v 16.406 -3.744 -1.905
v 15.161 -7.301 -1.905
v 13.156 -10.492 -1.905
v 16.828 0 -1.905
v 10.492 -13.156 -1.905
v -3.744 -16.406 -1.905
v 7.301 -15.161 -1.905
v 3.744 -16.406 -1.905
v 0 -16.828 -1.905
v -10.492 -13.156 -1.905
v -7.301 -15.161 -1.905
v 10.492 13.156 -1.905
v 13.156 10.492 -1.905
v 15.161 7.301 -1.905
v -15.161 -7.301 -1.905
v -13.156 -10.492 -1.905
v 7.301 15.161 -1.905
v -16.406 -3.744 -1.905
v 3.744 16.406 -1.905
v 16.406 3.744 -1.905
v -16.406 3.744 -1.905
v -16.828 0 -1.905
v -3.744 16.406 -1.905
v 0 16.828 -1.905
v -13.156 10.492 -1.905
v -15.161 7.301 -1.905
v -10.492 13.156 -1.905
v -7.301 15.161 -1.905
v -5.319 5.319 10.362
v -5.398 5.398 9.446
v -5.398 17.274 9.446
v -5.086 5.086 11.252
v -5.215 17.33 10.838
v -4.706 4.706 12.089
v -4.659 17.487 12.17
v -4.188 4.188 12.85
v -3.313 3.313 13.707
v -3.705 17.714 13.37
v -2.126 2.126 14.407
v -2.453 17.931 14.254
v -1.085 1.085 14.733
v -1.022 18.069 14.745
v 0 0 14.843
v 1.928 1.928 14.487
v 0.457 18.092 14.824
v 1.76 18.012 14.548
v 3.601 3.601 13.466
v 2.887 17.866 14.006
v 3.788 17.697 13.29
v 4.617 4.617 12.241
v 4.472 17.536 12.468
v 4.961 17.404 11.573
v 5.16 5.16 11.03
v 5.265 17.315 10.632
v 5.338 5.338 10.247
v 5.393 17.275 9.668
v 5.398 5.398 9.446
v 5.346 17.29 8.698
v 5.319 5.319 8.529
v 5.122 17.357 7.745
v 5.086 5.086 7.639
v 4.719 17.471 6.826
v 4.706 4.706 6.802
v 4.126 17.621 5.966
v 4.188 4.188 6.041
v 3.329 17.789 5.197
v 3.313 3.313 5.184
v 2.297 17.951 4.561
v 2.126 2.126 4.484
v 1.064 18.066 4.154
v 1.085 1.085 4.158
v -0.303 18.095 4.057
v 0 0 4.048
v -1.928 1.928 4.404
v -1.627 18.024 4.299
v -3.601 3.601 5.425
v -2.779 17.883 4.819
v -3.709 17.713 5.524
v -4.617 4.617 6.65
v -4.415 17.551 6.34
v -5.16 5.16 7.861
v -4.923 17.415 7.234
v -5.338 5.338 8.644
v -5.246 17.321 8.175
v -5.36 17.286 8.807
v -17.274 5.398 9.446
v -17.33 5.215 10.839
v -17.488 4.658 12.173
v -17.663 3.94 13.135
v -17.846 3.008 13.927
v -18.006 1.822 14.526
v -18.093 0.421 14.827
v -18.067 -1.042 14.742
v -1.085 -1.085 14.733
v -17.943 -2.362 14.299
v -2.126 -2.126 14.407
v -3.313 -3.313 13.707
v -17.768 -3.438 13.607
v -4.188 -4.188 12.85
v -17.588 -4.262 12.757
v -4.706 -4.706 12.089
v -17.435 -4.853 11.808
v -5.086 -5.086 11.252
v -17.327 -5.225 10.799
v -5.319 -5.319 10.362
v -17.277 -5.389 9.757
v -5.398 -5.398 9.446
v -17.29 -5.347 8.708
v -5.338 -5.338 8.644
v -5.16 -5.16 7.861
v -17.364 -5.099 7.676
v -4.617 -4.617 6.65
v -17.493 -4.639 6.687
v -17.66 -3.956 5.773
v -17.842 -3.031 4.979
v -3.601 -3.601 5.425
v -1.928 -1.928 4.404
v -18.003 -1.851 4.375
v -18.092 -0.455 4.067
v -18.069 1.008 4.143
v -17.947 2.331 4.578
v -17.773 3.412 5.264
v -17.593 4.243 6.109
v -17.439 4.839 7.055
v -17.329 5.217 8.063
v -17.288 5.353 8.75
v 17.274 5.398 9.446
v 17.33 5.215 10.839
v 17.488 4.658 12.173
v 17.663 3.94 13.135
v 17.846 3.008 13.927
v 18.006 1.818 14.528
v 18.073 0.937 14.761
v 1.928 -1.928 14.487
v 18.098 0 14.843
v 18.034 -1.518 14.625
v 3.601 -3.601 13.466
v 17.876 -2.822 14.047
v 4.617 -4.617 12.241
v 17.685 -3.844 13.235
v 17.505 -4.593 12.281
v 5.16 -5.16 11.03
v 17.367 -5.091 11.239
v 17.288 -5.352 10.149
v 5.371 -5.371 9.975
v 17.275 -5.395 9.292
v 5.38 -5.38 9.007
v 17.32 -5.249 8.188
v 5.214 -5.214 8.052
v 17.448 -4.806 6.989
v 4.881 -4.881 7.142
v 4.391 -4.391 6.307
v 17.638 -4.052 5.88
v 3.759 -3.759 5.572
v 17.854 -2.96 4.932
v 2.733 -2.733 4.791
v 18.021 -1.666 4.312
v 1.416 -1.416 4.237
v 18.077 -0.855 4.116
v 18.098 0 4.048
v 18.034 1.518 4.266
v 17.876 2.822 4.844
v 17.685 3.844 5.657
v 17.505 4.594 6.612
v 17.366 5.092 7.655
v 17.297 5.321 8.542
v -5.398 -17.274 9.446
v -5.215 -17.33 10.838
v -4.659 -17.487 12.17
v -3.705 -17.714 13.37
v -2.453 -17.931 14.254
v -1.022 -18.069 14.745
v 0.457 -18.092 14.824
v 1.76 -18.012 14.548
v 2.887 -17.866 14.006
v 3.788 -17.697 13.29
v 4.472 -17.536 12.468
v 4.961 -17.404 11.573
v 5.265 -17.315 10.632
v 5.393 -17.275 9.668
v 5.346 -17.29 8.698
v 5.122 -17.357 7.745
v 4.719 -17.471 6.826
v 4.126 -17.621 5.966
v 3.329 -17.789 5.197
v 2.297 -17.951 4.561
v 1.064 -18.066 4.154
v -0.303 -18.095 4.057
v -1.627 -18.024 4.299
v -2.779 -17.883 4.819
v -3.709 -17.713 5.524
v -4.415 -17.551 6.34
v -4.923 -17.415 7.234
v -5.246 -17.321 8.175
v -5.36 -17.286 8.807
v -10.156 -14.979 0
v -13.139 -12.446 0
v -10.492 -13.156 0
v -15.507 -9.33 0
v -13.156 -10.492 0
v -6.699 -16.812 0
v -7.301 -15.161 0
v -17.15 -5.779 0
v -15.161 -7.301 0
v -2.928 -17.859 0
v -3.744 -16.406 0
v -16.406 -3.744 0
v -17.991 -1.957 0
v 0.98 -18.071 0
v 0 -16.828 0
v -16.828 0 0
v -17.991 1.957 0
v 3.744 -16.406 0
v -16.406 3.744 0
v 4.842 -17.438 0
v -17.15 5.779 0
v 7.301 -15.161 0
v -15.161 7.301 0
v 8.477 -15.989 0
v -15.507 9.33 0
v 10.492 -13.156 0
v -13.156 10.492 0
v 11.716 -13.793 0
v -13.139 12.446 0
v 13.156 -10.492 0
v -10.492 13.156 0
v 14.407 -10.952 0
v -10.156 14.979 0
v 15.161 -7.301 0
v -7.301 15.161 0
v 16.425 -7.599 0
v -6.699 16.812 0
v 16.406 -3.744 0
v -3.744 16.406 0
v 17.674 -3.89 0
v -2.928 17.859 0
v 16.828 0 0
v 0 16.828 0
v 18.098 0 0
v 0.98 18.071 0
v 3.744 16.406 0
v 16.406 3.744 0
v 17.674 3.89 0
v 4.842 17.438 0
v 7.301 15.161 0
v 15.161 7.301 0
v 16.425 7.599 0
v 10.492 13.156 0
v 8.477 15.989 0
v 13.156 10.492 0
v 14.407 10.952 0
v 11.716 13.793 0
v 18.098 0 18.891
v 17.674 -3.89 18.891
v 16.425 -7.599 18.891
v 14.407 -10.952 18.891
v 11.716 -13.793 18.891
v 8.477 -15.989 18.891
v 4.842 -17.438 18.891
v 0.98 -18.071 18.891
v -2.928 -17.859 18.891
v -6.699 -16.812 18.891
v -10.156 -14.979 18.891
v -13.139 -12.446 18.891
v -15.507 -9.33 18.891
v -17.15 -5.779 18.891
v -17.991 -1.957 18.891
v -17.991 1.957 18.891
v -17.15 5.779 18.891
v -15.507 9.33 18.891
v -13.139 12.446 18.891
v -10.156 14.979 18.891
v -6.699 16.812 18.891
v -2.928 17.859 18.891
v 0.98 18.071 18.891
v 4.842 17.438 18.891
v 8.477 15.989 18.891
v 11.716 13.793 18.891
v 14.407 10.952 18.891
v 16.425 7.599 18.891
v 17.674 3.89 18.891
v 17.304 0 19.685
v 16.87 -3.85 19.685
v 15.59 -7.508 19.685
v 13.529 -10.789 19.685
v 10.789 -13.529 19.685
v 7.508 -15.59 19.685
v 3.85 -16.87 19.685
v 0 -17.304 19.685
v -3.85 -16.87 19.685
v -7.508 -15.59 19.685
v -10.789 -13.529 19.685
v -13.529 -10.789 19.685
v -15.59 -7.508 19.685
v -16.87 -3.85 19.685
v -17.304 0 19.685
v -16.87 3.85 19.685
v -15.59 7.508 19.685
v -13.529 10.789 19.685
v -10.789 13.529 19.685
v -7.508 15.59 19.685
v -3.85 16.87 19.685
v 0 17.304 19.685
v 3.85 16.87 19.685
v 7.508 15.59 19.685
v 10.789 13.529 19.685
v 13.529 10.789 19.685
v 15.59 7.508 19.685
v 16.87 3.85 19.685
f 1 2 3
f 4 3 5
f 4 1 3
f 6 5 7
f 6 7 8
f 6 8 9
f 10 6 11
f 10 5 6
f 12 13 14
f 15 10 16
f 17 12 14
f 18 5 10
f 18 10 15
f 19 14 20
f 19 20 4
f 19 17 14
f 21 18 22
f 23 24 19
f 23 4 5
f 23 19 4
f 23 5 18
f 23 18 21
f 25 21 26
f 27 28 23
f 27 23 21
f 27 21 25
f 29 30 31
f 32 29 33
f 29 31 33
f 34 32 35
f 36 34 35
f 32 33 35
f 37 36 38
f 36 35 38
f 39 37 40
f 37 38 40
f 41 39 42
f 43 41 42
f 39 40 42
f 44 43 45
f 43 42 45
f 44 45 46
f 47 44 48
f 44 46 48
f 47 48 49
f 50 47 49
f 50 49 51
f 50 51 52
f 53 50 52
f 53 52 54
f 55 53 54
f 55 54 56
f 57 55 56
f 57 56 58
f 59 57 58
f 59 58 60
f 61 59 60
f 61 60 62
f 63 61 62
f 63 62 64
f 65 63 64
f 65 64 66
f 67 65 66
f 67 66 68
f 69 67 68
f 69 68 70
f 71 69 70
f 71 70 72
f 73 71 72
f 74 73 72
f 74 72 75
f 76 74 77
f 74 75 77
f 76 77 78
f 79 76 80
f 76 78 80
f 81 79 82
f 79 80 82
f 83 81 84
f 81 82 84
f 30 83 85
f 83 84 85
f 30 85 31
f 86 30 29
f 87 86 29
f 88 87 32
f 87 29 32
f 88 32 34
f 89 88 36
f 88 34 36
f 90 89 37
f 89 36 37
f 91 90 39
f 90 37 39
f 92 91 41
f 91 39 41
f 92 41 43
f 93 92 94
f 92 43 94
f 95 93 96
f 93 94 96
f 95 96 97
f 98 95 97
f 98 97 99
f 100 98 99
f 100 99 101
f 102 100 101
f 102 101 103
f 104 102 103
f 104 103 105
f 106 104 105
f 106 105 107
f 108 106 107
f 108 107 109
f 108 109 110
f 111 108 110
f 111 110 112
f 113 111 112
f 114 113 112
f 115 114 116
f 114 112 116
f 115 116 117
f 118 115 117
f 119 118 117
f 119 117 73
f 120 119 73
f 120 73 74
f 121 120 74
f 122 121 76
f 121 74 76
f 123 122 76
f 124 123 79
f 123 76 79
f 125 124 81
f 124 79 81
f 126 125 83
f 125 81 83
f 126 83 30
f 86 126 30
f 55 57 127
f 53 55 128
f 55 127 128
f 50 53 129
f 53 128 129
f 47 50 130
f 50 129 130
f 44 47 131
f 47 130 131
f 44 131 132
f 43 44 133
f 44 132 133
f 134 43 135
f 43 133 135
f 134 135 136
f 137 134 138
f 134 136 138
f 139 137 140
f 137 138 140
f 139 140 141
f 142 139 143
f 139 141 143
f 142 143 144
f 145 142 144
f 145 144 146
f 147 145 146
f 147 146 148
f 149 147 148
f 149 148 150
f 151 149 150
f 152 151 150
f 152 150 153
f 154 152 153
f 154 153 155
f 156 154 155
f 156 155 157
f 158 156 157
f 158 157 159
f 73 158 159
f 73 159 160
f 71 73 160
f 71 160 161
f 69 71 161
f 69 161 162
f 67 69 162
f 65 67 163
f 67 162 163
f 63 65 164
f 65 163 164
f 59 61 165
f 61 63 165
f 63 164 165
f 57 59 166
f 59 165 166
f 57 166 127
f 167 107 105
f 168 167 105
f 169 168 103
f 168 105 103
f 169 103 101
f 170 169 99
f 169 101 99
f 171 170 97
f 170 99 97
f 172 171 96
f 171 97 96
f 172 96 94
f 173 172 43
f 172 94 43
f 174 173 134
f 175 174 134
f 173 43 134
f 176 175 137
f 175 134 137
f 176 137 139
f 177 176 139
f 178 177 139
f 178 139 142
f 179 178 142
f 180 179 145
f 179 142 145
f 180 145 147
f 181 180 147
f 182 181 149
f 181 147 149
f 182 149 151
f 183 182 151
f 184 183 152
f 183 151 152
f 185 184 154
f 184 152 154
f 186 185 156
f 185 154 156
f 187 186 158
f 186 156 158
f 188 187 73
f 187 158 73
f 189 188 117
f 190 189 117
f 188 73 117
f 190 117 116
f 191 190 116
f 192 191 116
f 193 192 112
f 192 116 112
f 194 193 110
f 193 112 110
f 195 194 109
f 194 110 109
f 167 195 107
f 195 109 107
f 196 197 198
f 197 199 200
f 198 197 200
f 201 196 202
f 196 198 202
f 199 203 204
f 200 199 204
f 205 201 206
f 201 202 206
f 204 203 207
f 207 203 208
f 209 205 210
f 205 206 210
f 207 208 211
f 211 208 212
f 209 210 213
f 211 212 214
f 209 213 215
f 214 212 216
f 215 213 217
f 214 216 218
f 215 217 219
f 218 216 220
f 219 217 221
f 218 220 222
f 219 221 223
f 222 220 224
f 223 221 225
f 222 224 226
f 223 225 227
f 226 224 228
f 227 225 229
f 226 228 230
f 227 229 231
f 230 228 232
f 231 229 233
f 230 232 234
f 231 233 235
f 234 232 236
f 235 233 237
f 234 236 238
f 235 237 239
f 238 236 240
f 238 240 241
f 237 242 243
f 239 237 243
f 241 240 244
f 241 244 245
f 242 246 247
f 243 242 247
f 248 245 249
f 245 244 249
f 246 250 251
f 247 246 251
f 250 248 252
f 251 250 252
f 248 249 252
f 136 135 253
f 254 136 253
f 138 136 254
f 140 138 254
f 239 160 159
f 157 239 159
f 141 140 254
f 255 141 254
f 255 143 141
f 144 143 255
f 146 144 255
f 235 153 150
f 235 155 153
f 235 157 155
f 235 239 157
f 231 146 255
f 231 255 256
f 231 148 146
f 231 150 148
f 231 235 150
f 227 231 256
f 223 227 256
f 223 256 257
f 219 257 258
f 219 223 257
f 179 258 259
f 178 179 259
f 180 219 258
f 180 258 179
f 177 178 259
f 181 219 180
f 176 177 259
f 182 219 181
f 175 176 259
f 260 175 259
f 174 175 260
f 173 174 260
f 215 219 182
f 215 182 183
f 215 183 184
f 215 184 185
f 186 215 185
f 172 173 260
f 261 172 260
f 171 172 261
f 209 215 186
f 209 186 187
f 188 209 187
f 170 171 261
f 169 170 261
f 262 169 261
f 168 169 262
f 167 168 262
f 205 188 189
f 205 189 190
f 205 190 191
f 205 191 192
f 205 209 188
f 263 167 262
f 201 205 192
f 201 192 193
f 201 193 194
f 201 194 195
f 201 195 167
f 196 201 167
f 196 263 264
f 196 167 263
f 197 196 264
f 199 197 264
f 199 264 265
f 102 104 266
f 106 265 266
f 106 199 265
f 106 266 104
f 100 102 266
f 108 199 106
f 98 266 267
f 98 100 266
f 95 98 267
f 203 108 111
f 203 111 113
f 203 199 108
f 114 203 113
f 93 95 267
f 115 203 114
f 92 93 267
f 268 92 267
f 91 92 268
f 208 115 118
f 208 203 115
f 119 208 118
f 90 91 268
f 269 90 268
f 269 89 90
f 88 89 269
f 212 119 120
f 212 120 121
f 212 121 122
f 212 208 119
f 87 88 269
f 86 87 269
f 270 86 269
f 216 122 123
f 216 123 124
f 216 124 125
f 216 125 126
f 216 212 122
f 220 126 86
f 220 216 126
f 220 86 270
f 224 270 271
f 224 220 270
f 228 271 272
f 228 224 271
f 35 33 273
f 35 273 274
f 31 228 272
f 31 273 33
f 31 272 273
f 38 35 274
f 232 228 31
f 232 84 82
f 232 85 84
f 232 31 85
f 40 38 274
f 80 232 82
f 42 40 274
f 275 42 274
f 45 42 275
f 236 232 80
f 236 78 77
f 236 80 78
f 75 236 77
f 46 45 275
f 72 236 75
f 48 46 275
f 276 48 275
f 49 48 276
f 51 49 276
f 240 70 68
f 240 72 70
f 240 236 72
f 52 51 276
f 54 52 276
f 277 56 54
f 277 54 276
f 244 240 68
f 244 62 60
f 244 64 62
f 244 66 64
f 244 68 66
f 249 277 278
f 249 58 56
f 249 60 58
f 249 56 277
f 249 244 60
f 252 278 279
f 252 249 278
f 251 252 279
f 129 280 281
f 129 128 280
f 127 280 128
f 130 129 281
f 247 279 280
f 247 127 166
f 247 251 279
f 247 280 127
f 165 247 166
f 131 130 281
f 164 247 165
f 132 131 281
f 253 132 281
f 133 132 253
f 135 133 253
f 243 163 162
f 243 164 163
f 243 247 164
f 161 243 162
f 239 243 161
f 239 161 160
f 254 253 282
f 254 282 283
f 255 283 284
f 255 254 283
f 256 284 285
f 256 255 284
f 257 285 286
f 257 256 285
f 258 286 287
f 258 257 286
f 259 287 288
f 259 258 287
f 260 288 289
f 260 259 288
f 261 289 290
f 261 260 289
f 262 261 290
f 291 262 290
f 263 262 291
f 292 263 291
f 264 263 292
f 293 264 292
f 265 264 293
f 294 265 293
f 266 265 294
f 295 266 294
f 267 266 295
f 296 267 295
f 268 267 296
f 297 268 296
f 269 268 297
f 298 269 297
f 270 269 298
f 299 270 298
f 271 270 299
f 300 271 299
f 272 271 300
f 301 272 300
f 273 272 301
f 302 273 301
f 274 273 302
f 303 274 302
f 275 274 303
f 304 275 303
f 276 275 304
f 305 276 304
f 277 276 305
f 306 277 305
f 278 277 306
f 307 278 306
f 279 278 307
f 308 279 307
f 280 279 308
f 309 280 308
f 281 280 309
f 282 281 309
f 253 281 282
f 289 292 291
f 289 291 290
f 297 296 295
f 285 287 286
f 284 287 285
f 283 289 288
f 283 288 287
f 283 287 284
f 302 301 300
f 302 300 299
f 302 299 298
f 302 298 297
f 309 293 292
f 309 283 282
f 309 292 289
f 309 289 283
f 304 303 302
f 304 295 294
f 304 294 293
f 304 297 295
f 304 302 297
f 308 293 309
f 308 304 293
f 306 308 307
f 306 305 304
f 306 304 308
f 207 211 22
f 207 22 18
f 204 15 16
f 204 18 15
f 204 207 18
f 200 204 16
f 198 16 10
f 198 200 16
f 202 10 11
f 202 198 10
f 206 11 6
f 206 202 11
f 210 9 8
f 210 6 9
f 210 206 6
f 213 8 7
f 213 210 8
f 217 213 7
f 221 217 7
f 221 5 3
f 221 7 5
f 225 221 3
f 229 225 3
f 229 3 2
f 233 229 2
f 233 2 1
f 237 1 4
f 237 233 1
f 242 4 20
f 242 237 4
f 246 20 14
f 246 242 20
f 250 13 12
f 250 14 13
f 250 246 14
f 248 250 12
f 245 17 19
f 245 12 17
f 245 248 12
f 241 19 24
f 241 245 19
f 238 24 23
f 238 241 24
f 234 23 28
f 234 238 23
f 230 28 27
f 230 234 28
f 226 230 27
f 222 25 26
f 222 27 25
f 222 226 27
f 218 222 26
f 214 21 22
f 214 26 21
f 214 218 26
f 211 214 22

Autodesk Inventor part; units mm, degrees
sketch "Sketch1" plane through (0, 0, 0) normal (0, 0, 1) x (1, 0, 0)
  circle A0 centre (0, 0) radius 18.0975
  dimension "d0" = 36.195
extrude "Extrusion1" add sketch "Sketch1" along normal blind 19.685
chamfer "Chamfer1" distance 0.7937 angle 45 1 edges at (-18.0975, 0, 19.685)
sketch "Sketch2" plane through (0, 0, 0) normal (0, 0, -1) x (-1, 0, 0)
  circle A0 centre (0, 0) radius 18.0975 projected
  circle A1 centre (0, 0) radius 16.8275
  dimension "d6" = 33.655
extrude "Extrusion2" add sketch "Sketch2" along normal blind 1.905 contours A1
ref_plane "Work Plane1" through (0, 0, 0) normal (0, 1, 0) x (-1, 0, 0)
sketch "Sketch3" plane through (0, 0, 0) normal (0, 1, 0) x (-1, 0, 0)
  line L0 (-18.0975, 0) -> (18.0975, 0) projected
  line L1 (18.0975, 18.8913) -> (-18.0975, 18.8913) projected
  line L2 (18.0975, 0) -> (18.0975, 18.8913) projected
  line L3 (-18.0975, 0) -> (-18.0975, 18.8913) projected
  circle A0 centre (0, 9.4456) radius 5.3975
  point P0 (0, 0)
  dimension "d10" = 10.795
extrude "Extrusion3" cut sketch "Sketch3" against normal mid plane 76.2 contours A0
ref_plane "Work Plane2" through (0, 0, 0) normal (0, 1, 0) x (-1, 0, 0)
sketch "Sketch4" plane through (0, 0, 0) normal (0, 1, 0) x (-1, 0, 0)
  point P0 (0, 0)
ref_plane "Work Plane3" through (0, 0, 0) normal (1, 0, 0) x (0, 1, 0)
sketch "Sketch5" plane through (0, 0, 0) normal (1, 0, 0) x (0, 1, 0)
  line L0 (18.0975, 0) -> (18.0975, 18.8913) projected
  line L1 (-18.0975, 0) -> (-18.0975, 18.8913) projected
  line L2 (-18.0975, 0) -> (18.0975, 0) projected
  line L3 (-17.3038, 19.685) -> (17.3038, 19.685) projected
  circle A0 centre (0, 9.4456) radius 5.3975
  point P0 (0, 0)
  dimension "d15" = 10.795
extrude "Extrusion4" cut sketch "Sketch5" against normal mid plane 76.2
thread "Thread1" size "7/16-14 UNC" class "2B" standard "ANSI Unified Screw Threads" full length
thread "Thread2" size "7/16-14 UNC" class "2B" standard "ANSI Unified Screw Threads" full length
thread "Thread3" size "7/16-14 UNC" class "2B" standard "ANSI Unified Screw Threads" full length
thread "Thread4" size "7/16-14 UNC" class "2B" standard "ANSI Unified Screw Threads" full length
properties part number "Regulator Base 1764"
